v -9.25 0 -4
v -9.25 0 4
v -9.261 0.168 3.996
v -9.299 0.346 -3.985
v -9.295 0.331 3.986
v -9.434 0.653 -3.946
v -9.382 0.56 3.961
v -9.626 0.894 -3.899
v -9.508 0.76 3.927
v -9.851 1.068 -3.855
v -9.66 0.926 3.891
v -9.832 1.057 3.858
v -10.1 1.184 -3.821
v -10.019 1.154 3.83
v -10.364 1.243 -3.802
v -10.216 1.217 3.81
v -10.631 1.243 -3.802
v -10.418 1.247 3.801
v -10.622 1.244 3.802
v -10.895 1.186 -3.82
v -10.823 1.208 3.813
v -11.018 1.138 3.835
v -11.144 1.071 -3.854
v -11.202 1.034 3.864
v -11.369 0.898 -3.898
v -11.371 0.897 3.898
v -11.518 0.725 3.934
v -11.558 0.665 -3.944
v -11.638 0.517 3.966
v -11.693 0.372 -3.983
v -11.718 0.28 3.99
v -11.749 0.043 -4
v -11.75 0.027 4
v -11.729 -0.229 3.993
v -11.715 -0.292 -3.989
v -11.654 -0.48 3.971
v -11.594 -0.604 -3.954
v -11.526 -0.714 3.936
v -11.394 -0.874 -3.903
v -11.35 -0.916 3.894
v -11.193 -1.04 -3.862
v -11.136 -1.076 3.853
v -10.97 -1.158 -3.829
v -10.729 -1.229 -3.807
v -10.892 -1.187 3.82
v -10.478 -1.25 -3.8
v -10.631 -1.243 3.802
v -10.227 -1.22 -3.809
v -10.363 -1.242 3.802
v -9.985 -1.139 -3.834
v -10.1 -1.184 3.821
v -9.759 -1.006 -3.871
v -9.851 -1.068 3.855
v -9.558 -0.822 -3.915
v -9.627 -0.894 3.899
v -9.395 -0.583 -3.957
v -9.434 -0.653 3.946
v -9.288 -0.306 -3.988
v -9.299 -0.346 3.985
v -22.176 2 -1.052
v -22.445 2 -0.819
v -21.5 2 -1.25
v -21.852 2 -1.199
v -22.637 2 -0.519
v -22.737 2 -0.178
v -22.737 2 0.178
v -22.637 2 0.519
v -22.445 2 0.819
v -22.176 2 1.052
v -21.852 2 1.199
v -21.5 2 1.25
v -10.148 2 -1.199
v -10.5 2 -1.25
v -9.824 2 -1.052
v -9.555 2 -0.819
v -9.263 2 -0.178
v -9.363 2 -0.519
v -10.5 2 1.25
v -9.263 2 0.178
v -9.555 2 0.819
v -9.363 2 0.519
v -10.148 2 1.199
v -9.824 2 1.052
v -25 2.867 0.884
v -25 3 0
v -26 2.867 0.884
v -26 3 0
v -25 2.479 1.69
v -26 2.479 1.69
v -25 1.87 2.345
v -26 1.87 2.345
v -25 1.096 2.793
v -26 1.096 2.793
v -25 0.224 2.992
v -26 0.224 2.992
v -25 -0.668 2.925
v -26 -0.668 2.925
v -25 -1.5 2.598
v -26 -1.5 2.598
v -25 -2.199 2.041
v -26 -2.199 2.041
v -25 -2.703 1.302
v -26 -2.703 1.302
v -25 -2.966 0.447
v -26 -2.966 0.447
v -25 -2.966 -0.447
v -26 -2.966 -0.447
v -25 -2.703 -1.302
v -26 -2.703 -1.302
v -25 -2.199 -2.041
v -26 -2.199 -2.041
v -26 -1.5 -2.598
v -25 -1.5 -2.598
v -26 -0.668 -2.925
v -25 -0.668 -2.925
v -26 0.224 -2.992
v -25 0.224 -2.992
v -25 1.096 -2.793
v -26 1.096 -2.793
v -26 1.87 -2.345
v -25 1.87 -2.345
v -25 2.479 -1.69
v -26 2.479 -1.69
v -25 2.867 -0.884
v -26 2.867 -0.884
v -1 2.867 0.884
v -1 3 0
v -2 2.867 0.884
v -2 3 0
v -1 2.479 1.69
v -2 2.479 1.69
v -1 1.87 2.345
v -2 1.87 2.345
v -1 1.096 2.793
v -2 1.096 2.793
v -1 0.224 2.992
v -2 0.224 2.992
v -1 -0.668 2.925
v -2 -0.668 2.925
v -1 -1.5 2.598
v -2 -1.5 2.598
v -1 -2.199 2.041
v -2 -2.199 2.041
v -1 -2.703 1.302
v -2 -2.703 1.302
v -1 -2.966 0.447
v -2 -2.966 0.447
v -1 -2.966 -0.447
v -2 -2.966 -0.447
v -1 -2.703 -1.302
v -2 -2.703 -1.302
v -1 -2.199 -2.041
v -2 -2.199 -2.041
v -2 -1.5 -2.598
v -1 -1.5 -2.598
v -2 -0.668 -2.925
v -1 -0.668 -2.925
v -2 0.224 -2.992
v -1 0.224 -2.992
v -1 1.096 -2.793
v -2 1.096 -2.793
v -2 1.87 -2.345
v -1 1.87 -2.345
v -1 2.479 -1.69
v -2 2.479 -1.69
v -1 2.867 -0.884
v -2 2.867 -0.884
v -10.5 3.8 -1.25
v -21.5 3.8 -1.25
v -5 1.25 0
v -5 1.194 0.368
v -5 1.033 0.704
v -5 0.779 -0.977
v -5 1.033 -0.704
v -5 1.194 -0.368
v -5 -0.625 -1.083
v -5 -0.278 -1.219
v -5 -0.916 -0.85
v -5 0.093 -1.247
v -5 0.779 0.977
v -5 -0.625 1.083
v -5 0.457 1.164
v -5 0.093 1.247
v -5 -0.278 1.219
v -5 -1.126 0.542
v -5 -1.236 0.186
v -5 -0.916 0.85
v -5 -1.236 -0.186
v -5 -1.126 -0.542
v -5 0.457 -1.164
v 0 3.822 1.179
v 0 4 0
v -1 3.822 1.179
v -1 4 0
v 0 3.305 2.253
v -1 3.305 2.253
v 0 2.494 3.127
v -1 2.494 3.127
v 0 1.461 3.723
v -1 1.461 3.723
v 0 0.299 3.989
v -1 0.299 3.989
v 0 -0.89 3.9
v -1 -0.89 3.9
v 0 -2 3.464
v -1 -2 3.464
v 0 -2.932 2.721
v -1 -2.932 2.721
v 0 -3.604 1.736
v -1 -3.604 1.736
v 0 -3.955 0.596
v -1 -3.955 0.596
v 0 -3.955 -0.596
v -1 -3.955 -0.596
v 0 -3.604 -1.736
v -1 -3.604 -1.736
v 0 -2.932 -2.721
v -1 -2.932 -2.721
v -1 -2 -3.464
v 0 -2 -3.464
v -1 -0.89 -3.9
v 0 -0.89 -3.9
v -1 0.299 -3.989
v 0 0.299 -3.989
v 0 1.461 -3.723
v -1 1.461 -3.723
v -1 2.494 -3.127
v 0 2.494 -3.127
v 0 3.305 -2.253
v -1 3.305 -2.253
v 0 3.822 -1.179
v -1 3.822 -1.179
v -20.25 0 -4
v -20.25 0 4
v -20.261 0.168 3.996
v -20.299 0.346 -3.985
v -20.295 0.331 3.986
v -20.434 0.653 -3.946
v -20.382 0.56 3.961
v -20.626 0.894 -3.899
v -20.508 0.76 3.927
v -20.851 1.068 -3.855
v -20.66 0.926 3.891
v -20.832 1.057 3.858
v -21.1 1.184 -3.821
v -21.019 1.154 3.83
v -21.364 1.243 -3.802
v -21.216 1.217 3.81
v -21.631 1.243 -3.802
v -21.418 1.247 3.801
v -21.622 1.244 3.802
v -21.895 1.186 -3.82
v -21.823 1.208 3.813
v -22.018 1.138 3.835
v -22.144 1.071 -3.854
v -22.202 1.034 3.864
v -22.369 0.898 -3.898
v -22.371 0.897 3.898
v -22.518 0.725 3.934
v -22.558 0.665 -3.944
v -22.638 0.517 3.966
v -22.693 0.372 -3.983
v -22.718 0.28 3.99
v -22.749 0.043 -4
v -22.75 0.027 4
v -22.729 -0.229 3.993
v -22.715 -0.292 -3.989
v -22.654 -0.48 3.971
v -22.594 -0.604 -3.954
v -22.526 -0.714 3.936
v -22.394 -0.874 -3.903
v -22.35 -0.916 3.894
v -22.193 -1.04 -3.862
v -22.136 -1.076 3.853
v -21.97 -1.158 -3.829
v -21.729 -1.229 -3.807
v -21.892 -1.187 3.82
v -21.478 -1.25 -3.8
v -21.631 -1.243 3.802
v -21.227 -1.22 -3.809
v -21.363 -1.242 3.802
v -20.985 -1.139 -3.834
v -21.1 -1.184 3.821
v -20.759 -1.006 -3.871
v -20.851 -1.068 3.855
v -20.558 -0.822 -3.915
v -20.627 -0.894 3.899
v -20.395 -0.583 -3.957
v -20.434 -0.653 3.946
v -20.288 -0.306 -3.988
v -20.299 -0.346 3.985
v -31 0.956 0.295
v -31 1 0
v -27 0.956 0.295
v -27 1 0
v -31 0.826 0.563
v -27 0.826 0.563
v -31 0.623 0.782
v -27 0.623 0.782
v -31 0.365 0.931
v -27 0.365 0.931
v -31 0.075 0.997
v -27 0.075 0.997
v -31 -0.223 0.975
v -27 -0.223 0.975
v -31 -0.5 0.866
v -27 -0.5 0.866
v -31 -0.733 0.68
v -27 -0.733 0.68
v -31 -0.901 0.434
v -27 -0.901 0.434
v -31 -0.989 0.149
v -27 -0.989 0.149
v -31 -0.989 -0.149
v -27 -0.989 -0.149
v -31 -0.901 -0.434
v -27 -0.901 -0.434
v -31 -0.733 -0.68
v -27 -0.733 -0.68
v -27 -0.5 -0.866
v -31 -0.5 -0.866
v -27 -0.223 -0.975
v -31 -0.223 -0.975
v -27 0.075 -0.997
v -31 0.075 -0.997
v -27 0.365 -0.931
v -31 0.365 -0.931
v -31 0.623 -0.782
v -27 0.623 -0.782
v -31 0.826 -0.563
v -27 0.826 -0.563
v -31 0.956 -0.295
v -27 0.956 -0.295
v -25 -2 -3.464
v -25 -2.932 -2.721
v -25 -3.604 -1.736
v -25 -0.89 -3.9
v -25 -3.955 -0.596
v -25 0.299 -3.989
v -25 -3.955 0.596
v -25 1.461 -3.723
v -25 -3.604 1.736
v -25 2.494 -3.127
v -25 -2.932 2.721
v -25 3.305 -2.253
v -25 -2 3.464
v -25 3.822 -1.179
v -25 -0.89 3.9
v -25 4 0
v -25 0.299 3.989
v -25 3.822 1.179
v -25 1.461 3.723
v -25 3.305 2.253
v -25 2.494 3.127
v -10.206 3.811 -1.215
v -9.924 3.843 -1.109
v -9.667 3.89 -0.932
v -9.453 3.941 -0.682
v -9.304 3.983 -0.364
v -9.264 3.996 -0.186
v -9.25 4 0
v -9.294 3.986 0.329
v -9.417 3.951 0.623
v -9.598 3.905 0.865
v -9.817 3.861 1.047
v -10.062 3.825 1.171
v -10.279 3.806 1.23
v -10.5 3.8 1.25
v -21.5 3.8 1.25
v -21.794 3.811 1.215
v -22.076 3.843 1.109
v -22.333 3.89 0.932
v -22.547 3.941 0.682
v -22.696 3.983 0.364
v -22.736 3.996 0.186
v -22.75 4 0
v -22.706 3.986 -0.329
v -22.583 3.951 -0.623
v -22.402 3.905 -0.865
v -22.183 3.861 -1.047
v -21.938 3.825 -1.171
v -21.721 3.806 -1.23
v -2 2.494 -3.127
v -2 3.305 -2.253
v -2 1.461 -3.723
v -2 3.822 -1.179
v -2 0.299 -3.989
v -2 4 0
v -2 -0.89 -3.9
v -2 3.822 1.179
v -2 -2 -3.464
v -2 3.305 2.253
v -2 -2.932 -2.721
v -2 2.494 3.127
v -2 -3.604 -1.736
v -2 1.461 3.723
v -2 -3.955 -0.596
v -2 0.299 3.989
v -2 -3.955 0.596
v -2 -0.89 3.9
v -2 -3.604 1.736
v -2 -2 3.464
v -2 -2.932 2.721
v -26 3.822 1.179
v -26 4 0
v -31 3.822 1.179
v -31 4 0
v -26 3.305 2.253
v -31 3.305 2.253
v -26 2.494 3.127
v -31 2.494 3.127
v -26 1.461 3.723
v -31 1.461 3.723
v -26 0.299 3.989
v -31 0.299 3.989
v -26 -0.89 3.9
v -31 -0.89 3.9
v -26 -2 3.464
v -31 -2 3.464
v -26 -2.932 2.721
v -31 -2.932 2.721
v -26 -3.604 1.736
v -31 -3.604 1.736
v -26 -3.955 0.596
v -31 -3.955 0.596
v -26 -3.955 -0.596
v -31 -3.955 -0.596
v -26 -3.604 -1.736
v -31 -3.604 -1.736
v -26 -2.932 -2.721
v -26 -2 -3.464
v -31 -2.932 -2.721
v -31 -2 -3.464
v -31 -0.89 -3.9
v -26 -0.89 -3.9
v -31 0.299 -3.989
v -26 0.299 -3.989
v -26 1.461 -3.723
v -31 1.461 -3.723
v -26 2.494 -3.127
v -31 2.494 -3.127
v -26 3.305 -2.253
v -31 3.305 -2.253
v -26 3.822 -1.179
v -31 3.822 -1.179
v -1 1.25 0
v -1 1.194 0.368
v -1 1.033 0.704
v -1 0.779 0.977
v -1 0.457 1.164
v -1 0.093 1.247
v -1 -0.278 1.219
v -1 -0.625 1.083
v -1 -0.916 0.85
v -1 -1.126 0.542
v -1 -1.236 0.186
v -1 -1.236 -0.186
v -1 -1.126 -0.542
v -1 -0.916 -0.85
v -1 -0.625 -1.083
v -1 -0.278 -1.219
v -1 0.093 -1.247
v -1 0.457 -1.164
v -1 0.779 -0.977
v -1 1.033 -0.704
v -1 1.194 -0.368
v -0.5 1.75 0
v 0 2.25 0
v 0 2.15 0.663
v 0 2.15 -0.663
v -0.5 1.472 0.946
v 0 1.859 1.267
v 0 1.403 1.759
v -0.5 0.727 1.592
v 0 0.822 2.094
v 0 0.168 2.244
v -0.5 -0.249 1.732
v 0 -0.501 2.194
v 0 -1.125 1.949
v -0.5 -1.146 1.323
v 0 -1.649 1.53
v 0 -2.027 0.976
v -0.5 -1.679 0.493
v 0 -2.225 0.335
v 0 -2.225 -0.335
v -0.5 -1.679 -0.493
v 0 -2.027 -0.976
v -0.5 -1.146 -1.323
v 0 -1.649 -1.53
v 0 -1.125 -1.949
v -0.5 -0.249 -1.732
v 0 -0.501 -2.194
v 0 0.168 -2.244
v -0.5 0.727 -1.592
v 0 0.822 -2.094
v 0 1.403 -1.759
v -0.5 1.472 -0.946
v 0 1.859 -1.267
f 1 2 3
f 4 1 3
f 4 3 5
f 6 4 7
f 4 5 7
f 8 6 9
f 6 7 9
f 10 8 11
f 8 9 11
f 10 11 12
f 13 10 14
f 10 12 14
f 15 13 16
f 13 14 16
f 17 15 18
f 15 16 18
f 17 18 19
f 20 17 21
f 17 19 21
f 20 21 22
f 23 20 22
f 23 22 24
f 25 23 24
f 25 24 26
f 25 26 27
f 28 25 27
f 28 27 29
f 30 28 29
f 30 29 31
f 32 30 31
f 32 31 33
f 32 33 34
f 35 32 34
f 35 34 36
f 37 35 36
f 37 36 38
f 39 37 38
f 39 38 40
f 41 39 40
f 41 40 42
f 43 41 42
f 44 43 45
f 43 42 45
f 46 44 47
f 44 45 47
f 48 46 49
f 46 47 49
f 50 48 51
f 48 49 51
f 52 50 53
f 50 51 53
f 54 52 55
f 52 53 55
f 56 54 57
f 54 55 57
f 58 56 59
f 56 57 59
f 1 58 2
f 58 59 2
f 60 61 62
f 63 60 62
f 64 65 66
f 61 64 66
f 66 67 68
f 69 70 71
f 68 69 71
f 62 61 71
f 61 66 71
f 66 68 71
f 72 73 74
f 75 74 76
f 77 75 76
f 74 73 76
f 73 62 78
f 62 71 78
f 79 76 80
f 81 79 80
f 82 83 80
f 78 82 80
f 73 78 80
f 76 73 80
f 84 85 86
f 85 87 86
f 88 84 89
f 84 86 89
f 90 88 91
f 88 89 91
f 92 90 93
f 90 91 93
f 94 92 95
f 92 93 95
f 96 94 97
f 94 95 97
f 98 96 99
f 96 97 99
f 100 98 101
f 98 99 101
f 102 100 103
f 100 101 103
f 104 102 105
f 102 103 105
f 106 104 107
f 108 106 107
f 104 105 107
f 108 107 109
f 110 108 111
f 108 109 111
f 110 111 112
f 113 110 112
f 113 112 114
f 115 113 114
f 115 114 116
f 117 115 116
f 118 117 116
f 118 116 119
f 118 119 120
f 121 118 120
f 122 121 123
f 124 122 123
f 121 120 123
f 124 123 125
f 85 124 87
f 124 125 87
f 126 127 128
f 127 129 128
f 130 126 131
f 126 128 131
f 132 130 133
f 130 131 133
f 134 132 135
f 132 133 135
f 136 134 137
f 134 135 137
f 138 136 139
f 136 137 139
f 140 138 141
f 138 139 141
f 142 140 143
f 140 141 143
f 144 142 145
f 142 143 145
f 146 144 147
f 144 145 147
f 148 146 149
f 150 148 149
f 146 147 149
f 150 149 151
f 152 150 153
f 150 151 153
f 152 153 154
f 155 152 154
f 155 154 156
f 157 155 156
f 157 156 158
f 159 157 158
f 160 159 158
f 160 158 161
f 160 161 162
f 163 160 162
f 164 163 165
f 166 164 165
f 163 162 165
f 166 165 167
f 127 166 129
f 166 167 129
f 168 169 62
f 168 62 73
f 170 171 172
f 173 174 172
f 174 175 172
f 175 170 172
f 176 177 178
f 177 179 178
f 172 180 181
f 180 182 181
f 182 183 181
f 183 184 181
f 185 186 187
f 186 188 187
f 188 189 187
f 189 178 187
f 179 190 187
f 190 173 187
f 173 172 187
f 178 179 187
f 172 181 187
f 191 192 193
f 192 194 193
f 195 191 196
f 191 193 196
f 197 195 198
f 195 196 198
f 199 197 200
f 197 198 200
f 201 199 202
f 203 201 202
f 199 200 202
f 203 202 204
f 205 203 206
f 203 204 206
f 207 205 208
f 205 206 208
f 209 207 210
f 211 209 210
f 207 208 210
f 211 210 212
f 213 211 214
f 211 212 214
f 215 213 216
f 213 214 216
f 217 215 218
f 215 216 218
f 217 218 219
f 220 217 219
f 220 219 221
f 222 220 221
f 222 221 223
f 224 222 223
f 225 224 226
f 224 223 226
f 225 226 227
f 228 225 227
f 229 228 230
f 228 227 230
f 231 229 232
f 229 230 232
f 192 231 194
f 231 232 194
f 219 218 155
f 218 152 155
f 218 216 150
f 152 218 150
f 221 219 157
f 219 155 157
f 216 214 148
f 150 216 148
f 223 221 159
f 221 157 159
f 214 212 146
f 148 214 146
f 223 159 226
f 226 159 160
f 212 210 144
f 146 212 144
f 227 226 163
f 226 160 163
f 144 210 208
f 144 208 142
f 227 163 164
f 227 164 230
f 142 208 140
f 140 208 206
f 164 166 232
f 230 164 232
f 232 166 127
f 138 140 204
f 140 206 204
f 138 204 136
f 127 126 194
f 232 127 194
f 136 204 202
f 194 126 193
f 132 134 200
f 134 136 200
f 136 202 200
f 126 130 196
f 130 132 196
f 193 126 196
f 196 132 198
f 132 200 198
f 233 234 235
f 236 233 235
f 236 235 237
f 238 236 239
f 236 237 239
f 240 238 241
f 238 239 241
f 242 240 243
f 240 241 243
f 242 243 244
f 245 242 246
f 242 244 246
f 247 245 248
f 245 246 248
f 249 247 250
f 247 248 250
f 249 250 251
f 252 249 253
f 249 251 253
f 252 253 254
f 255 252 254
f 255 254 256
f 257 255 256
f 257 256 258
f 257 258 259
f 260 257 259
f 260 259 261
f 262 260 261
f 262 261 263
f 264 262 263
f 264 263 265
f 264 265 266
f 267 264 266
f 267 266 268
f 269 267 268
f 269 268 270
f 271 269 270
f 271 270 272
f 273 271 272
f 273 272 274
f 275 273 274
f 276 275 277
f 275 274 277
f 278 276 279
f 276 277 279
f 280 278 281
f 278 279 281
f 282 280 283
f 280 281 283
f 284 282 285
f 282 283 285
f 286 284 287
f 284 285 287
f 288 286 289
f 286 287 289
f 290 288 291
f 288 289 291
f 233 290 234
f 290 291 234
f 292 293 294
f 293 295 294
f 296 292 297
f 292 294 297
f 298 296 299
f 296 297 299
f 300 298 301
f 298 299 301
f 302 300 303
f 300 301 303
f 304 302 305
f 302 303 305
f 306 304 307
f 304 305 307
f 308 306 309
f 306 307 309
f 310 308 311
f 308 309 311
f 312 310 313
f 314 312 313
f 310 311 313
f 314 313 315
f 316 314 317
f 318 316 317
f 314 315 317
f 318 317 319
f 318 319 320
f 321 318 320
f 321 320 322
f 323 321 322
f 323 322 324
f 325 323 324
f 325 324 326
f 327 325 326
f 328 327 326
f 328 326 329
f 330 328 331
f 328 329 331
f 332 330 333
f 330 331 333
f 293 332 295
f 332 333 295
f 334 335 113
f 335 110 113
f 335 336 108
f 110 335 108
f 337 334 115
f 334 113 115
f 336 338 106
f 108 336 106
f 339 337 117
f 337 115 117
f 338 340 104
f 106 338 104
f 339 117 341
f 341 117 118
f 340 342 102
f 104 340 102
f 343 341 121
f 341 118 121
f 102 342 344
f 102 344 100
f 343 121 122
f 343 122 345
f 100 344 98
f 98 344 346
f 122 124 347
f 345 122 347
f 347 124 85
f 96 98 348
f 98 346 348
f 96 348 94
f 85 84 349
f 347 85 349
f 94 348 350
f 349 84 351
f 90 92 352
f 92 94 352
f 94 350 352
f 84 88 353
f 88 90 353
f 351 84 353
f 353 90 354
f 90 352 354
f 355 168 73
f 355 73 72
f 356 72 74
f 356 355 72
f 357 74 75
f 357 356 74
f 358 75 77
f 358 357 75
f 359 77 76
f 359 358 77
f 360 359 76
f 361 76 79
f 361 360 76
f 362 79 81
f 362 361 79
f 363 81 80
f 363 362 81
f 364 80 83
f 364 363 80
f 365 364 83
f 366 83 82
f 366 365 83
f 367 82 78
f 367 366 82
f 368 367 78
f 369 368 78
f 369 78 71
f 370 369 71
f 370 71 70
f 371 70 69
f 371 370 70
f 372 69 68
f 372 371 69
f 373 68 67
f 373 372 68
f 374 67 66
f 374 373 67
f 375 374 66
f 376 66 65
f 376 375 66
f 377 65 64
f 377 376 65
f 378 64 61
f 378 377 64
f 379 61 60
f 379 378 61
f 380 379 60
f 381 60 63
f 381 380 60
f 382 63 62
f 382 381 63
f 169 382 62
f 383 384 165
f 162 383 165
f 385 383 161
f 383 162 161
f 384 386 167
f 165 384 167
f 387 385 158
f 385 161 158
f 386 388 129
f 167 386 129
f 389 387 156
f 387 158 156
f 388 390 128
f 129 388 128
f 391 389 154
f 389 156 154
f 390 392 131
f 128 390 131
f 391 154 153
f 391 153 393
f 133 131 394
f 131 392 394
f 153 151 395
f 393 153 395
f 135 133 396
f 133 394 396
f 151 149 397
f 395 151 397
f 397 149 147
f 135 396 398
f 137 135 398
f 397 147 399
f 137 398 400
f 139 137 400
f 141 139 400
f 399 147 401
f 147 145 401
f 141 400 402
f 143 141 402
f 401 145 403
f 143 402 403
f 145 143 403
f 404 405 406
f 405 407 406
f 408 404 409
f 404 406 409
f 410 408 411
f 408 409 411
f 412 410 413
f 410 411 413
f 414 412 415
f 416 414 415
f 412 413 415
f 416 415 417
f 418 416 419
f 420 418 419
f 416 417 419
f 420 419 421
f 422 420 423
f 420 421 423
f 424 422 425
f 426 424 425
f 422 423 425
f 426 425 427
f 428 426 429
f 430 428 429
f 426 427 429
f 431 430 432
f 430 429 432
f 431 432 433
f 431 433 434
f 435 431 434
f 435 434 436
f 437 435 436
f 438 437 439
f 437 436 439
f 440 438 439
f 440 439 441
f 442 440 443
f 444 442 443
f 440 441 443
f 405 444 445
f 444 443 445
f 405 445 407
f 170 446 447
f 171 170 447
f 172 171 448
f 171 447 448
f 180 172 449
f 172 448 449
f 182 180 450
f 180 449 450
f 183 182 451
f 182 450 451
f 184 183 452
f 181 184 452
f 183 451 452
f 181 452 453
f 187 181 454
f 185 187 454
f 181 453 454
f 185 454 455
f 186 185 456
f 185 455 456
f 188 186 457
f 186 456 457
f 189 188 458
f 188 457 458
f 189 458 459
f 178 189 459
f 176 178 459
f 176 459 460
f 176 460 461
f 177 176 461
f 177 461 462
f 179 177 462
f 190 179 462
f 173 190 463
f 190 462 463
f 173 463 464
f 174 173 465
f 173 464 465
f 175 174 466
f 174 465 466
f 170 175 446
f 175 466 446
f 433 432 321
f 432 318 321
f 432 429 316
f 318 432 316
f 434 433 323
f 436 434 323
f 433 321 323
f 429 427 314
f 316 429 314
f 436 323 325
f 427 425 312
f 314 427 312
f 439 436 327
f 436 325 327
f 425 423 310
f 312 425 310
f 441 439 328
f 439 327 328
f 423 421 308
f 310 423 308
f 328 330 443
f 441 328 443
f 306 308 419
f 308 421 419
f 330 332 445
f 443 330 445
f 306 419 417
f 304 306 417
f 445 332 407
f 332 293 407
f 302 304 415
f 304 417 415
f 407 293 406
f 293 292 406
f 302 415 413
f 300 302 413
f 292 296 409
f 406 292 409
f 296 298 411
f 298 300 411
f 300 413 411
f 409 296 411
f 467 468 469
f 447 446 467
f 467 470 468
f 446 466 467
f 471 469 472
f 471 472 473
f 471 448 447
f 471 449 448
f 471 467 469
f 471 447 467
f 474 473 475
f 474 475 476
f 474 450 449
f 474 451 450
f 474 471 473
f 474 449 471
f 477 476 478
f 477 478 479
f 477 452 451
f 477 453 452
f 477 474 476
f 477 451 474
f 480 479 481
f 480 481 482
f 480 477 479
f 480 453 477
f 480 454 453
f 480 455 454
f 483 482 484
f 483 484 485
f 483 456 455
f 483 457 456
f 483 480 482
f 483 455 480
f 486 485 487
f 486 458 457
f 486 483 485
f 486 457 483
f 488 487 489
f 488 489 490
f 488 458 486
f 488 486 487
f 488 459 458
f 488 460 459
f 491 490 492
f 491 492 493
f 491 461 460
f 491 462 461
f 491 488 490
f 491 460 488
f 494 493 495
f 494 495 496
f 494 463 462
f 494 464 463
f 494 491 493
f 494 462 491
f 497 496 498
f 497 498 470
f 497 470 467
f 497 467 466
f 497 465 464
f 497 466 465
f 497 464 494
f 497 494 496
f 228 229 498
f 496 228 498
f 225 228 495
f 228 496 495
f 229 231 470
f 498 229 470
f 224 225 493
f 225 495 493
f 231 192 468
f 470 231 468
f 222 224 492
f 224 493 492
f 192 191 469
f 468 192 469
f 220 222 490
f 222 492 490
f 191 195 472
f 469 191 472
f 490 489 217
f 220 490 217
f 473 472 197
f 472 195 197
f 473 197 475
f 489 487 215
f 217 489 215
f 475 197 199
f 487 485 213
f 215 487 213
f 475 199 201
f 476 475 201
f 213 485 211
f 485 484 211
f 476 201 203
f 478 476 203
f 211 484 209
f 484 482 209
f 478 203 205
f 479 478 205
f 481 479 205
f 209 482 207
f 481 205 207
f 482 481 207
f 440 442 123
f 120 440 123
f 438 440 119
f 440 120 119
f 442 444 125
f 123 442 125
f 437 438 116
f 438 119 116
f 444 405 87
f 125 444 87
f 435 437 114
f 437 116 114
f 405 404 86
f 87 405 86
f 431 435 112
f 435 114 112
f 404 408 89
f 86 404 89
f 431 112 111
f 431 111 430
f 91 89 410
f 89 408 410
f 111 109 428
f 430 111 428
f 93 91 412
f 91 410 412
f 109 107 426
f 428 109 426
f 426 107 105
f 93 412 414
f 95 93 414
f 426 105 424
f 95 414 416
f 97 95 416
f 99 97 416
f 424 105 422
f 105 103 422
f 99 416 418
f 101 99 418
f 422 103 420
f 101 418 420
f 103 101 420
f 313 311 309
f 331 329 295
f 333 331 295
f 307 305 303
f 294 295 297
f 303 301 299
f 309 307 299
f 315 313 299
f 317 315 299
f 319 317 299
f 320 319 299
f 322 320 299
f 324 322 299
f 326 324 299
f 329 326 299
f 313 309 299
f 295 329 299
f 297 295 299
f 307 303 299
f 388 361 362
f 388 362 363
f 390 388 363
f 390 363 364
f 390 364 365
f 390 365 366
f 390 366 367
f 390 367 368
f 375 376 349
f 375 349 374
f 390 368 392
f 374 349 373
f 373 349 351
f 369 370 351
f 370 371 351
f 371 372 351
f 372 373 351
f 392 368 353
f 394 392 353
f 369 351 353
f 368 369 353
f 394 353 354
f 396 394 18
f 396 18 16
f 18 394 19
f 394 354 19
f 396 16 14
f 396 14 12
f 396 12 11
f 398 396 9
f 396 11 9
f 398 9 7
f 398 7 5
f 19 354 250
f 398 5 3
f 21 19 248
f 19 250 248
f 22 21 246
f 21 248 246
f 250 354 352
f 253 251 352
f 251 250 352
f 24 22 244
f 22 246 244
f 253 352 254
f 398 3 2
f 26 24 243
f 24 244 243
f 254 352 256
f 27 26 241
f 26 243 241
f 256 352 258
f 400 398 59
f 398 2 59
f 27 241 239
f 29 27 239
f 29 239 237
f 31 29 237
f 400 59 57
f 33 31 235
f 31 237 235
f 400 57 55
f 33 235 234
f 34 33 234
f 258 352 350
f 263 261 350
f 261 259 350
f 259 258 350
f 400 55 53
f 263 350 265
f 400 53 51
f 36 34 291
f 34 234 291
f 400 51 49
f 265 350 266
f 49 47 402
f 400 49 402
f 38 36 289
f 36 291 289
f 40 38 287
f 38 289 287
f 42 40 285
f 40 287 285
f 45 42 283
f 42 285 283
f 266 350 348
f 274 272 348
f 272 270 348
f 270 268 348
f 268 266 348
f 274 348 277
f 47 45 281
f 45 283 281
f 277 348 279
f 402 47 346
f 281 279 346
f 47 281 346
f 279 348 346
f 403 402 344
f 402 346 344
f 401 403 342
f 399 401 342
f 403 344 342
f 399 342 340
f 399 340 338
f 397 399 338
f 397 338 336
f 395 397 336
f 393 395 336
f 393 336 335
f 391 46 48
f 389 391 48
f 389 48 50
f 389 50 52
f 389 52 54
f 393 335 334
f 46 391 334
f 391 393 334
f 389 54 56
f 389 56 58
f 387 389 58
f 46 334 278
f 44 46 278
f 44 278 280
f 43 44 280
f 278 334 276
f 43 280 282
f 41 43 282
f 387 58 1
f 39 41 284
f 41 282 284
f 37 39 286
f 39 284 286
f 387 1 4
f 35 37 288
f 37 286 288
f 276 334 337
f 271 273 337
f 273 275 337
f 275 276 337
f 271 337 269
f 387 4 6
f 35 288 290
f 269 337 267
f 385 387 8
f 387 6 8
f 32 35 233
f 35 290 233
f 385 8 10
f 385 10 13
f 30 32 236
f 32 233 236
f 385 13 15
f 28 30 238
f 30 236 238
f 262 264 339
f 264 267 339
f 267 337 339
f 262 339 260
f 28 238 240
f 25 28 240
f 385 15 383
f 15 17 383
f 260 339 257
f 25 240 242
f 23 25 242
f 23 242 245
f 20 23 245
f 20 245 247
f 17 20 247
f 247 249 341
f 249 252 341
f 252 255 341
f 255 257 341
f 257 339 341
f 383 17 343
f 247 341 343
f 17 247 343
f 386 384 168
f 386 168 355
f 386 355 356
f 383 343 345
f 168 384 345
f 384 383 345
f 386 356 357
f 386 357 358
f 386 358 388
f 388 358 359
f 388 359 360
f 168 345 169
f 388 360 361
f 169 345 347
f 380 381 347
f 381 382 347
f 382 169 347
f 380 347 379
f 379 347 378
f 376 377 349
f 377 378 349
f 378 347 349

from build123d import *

# Parameters (mm, degrees)
F3_R     = 1.25
F4_DEPTH = 25
F5_SIZE  = 1
F8_DEPTH = 2


with BuildPart() as f1:
    # F0 (on Top) → F1 (revolve)
    with BuildSketch(Plane.XY):
        Polygon((0, 1.25), (0, 2.9657871928), (0, 4), (-1, 4), (-1, 3), (-2, 3), (-2, 4), (-3, 4), (-8, 4), (-13, 4), (-19, 4), (-24, 4), (-25, 4), (-25, 3), (-26, 3), (-26, 4), (-31, 4), (-31, 1), (-27, 1), (-27, 0), (-5, 0), (-5, 1.25), (-0.9906101976, 1.25), align=None)
    revolve(axis=Axis((5.4950757935, 0, 0), (1, 0, 0)))

    # F3 (on offset) → F4 (cut)
    with BuildSketch(Plane.XY.offset(4)):
        with Locations((-21.5, 0)):
            Circle(F3_R)
        with Locations((-10.5, 0)):
            Circle(F3_R)
    extrude(amount=-F4_DEPTH, mode=Mode.SUBTRACT)

    # F5
    f5_edges = [f1.edges().sort_by_distance(p)[0] for p in [
        (0, -1.25, 0),
    ]]
    chamfer(f5_edges, length=F5_SIZE)

    # F7 (on offset) → F8 (cut)
    with BuildSketch(Plane.XZ.offset(-4)):
        with BuildLine():
            Line((-21.5, -1.25), (-10.5, -1.25))
            ThreePointArc((-10.5, -1.25), (-9.25, 0), (-10.5, 1.25))
            Line((-10.5, 1.25), (-21.5, 1.25))
            ThreePointArc((-21.5, 1.25), (-22.75, 0), (-21.5, -1.25))
        make_face()
    extrude(amount=F8_DEPTH, mode=Mode.SUBTRACT)


solid = f1.part
